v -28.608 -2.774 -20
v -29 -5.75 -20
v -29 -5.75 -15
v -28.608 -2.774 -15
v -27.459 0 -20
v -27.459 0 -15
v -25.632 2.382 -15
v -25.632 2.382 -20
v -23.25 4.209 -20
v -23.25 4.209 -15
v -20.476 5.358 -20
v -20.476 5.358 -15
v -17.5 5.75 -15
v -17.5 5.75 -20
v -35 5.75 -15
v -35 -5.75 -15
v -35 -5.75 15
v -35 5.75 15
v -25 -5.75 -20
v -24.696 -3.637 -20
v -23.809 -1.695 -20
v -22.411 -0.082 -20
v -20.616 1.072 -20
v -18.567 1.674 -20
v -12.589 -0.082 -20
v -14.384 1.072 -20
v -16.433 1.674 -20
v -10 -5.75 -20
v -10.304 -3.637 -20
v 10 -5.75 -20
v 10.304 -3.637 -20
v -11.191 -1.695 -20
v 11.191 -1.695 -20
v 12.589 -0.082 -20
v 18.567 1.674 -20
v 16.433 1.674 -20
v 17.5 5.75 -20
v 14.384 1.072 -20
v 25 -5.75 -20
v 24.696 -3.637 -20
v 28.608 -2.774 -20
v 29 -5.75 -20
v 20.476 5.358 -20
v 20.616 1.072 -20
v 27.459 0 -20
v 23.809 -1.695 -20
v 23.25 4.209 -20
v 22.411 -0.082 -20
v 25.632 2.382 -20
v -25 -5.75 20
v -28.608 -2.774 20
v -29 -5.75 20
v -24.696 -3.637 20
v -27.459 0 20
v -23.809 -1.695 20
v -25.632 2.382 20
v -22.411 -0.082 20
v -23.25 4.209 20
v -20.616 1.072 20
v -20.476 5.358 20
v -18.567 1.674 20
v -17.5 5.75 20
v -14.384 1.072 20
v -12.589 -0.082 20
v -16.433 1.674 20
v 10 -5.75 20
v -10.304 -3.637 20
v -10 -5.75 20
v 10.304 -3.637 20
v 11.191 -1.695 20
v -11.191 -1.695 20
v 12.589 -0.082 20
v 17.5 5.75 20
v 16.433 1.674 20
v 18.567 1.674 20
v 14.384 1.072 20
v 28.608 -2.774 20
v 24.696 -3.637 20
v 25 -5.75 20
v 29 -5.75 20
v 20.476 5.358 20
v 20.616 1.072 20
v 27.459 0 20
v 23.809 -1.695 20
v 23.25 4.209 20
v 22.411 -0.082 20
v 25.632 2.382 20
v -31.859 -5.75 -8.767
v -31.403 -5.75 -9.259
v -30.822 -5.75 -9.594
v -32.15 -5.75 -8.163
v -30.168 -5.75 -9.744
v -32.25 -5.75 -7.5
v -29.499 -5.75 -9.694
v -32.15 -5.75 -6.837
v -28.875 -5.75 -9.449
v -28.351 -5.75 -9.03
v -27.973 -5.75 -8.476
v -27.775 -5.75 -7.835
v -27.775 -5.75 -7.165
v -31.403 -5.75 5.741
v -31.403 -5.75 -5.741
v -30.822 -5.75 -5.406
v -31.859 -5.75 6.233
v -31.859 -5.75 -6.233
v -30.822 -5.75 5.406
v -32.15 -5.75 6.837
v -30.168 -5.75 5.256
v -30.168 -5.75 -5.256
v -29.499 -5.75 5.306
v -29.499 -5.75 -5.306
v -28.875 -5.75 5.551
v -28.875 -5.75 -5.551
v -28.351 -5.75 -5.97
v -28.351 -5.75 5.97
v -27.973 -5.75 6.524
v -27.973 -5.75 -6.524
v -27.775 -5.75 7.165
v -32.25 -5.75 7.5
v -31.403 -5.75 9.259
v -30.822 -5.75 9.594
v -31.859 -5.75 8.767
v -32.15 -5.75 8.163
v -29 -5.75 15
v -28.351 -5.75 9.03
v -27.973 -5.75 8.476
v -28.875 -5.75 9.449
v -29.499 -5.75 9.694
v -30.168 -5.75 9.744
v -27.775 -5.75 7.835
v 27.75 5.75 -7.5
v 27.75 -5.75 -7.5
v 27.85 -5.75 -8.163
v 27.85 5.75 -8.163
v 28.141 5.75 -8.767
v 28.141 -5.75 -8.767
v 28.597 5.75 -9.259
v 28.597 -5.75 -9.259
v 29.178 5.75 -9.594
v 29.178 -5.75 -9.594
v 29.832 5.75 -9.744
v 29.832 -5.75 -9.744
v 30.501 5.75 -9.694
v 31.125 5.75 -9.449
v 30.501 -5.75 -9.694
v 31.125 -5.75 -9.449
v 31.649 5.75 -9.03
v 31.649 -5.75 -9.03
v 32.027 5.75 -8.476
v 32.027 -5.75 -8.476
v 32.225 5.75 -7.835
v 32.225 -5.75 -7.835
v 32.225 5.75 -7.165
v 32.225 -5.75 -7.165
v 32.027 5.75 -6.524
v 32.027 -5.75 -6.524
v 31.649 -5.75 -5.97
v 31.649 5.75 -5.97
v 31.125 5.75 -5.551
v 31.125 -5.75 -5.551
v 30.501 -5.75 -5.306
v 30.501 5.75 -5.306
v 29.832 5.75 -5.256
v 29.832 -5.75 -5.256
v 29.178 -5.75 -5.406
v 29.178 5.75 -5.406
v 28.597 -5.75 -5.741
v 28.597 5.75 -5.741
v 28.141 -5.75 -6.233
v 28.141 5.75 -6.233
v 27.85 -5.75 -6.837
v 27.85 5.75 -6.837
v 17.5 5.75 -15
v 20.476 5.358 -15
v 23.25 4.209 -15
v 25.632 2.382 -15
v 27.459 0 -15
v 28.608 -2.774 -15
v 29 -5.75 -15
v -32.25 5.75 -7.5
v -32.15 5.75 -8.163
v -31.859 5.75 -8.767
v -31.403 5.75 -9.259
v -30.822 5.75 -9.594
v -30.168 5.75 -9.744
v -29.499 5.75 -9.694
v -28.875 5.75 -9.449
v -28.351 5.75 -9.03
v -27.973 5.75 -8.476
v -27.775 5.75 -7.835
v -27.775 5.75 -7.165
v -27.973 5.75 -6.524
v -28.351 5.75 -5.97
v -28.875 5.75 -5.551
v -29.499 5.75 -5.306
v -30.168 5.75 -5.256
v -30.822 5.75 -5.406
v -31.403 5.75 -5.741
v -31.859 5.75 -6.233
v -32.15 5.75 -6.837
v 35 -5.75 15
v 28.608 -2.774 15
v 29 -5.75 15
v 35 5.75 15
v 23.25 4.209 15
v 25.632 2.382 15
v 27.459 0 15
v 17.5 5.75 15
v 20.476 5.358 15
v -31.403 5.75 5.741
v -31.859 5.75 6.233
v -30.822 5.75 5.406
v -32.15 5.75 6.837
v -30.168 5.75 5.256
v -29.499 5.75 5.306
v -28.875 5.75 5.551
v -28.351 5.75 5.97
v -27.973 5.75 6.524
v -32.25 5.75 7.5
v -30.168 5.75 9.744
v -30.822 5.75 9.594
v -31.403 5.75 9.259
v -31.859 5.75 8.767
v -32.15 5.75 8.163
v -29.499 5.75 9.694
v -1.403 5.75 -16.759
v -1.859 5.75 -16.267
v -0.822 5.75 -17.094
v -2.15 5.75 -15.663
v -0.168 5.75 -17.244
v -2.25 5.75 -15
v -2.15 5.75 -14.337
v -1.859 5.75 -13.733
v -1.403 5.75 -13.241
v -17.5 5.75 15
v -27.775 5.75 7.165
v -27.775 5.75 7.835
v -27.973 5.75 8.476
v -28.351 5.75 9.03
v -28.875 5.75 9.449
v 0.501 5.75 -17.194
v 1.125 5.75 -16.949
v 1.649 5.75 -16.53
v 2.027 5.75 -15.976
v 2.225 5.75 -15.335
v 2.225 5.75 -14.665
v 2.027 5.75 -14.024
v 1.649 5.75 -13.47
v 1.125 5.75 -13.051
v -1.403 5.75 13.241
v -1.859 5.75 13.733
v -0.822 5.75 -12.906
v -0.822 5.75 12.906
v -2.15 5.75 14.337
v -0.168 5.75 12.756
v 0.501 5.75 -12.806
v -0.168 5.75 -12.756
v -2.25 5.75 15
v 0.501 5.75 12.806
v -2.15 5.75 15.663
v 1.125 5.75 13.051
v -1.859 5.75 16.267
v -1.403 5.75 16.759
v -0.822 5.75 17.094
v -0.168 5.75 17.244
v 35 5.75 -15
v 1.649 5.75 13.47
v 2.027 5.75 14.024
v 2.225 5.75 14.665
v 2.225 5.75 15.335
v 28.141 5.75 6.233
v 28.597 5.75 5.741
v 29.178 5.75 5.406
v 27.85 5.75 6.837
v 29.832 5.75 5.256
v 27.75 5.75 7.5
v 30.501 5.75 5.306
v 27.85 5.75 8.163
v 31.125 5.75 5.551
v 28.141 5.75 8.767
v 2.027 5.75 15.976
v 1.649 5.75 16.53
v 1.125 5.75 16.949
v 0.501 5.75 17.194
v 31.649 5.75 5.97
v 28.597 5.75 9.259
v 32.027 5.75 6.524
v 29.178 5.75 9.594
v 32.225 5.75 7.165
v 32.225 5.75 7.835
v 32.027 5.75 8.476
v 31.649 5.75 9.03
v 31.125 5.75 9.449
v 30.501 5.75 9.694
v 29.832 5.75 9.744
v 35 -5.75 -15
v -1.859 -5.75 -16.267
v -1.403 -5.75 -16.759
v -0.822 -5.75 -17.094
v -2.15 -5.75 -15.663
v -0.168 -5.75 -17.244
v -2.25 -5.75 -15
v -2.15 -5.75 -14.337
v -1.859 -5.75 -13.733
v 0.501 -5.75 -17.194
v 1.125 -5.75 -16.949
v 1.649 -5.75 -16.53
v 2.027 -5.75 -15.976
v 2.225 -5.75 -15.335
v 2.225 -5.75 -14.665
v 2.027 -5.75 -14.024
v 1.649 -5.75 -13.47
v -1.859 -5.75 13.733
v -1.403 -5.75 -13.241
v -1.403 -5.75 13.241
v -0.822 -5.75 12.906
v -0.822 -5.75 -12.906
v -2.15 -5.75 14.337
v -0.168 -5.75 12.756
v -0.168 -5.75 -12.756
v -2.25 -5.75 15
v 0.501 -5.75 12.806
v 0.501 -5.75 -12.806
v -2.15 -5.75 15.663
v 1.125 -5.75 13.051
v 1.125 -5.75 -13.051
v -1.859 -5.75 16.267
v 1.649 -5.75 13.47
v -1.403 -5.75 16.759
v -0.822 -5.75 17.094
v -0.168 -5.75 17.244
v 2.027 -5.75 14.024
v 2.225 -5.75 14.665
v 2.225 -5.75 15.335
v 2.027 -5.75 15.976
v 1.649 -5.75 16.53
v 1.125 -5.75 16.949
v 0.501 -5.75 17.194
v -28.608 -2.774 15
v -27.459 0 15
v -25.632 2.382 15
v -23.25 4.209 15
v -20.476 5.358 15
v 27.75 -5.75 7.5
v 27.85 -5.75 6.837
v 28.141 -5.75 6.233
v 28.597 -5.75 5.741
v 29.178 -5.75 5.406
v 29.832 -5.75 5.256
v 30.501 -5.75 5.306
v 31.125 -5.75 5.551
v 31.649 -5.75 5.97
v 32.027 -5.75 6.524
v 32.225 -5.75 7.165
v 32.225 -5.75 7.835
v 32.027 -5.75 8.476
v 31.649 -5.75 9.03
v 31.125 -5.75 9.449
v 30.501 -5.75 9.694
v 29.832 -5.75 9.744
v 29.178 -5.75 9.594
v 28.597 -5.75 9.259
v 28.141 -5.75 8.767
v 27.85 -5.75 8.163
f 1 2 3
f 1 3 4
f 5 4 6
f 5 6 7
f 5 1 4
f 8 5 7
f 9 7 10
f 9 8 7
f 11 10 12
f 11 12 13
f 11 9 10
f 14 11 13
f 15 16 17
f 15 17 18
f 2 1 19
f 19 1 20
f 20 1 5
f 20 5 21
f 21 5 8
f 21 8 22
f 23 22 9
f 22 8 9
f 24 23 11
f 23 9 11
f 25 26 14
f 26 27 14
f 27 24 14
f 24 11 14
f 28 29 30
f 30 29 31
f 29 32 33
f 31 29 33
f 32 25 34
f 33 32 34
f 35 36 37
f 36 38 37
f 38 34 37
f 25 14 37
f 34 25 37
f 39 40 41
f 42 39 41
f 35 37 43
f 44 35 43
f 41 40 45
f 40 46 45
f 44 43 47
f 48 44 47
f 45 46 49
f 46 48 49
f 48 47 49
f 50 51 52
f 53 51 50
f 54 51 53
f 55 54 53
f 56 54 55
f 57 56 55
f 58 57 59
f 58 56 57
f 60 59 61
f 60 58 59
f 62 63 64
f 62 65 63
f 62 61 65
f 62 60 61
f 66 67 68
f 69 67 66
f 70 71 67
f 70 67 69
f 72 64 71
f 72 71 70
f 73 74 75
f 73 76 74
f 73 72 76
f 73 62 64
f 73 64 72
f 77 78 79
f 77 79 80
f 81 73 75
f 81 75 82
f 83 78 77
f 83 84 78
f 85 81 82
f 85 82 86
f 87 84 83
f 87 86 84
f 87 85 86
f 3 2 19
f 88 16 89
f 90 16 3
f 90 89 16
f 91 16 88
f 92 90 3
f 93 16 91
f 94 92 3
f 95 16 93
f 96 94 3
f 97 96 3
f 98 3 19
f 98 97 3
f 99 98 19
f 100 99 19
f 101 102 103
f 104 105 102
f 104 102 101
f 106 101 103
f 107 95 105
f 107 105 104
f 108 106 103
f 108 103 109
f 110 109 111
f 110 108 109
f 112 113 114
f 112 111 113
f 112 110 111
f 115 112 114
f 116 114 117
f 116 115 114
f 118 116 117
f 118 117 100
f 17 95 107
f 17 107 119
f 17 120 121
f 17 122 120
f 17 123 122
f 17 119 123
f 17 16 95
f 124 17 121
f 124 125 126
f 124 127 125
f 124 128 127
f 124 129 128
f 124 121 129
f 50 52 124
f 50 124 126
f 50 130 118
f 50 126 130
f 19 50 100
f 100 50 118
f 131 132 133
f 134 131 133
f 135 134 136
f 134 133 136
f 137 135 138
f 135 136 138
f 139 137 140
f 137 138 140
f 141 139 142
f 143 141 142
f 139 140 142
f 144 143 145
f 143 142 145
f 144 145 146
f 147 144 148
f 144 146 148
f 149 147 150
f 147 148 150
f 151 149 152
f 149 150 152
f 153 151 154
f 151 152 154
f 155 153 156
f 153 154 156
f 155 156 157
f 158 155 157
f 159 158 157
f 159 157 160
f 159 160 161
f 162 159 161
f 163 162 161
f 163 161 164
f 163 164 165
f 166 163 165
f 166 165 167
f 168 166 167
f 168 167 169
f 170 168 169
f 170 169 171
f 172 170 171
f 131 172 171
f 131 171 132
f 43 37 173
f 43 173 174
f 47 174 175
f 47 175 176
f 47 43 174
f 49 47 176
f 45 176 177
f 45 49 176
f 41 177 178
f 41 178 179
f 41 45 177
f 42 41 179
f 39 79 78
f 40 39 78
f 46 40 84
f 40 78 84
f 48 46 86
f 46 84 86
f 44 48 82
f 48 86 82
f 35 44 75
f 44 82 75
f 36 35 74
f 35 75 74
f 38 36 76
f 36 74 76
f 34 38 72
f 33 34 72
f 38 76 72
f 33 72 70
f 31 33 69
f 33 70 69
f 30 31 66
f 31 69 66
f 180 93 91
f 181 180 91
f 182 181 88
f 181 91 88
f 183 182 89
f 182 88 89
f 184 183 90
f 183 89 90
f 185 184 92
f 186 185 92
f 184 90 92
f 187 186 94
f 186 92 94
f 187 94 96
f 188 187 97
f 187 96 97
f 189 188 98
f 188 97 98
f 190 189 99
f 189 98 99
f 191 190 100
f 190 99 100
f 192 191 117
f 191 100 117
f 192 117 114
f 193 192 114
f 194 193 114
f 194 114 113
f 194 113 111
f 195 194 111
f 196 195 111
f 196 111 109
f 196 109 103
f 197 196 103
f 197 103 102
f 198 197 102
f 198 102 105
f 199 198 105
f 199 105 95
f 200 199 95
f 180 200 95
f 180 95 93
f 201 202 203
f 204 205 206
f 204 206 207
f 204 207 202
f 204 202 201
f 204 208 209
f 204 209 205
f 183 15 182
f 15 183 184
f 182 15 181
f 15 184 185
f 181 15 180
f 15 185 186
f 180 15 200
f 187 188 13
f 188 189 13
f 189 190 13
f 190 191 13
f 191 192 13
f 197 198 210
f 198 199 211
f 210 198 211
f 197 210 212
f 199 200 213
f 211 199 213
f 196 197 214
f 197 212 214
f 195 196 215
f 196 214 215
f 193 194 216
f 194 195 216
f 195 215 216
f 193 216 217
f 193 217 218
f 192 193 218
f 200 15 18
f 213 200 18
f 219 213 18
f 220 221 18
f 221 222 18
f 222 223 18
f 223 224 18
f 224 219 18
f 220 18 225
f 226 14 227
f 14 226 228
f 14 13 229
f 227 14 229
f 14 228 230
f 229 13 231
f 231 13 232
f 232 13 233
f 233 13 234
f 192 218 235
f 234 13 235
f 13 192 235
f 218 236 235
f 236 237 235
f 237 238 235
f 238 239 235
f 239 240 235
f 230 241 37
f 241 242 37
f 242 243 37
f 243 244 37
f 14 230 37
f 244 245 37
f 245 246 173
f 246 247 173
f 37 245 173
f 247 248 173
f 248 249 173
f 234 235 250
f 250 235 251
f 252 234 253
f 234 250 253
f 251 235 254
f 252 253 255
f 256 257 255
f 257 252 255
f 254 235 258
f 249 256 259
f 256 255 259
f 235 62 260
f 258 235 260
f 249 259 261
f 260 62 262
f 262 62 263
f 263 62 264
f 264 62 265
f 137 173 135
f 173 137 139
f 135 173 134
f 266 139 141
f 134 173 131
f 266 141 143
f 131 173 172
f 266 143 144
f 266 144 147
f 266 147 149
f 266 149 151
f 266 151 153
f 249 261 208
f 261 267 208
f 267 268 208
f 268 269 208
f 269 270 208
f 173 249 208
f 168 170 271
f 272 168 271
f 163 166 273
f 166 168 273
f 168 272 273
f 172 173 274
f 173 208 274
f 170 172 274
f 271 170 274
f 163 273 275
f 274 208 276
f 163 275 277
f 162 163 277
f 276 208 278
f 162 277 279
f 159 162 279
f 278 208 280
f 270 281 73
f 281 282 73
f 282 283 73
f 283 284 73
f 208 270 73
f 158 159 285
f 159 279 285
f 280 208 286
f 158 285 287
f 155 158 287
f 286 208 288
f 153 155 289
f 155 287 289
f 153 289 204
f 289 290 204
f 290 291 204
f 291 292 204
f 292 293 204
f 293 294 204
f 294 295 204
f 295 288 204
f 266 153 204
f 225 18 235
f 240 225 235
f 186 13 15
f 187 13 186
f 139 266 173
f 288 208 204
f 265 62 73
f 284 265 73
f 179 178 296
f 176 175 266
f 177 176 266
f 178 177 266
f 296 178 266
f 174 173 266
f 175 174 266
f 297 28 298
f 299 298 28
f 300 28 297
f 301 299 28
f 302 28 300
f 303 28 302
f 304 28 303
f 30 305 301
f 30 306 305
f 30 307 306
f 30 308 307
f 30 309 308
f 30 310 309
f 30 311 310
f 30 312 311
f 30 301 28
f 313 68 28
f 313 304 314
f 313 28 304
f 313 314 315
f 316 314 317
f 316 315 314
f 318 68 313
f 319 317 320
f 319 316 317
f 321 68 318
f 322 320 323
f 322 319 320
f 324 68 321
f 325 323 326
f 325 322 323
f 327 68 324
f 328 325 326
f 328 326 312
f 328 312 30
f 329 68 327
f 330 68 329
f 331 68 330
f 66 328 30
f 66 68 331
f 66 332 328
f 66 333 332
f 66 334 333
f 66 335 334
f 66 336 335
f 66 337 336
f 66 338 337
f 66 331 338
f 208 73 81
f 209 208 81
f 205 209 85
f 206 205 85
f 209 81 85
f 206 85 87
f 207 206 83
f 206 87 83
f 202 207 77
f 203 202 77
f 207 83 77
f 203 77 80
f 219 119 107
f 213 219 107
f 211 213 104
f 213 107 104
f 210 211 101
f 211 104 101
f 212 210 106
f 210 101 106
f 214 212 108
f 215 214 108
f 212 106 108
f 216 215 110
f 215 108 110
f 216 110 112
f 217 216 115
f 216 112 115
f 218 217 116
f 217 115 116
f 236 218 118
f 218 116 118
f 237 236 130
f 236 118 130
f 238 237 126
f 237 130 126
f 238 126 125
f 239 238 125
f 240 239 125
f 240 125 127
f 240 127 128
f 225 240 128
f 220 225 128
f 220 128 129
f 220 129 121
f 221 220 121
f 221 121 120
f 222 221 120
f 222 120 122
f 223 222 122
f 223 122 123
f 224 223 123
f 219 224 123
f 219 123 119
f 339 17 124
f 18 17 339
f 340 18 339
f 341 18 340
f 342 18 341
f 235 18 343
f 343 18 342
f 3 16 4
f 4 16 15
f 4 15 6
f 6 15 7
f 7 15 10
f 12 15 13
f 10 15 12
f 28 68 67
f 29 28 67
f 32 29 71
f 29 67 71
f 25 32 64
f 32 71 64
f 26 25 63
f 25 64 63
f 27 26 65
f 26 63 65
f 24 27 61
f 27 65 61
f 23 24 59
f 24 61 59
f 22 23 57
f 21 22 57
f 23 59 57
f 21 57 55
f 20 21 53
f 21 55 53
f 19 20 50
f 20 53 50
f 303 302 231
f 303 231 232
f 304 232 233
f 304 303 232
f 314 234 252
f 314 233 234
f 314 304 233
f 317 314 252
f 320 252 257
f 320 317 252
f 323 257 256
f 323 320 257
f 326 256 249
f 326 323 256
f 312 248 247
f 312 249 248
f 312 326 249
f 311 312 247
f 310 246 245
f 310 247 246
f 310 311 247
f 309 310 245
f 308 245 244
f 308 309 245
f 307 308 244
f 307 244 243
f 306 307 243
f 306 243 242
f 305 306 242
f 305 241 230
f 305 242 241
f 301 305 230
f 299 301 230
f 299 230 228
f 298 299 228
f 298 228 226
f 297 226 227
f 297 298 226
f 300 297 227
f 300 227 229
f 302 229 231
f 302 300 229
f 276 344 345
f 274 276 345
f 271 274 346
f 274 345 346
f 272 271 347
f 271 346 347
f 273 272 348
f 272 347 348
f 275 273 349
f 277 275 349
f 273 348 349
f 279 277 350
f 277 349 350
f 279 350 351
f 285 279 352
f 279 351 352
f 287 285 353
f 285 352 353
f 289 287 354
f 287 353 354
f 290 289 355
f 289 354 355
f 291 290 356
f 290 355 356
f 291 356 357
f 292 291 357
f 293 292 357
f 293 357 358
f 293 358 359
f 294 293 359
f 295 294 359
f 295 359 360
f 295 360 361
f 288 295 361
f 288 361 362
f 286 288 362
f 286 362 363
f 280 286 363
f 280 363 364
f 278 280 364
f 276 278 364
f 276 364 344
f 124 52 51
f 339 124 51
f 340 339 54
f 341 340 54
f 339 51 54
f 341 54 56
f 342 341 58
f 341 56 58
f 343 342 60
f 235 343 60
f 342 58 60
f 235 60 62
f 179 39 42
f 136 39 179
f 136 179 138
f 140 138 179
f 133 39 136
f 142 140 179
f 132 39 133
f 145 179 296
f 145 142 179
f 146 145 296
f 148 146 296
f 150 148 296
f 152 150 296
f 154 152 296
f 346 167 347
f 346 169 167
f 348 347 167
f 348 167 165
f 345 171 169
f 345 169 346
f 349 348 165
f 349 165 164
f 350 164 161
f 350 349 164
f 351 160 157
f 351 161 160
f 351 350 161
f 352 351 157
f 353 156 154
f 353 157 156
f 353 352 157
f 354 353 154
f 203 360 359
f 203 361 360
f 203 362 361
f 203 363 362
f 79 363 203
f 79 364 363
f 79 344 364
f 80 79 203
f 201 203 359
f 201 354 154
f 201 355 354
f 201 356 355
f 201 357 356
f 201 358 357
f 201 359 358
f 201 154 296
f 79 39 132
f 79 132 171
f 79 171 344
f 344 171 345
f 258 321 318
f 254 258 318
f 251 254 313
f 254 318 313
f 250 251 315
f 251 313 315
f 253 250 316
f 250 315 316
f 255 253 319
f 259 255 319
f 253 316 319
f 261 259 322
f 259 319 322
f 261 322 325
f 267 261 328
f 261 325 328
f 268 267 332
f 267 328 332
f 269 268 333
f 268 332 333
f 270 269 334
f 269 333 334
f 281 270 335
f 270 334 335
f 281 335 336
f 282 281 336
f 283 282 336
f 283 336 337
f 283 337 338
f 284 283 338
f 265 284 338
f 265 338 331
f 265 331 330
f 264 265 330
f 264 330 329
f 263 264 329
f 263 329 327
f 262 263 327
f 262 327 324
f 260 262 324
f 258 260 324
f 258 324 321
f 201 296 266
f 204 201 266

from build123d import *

# Parameters (mm, degrees)
SKETCH1_W            = 70
SKETCH1_H            = 11.5
BOSS_EXTRUDE1_DEPTH  = 20
CUT_EXTRUDE1_REACH   = 55.461
CUT_EXTRUDE2_DEPTH   = 5
HOLE1_D              = 4.5
LPATTERN1_COUNT      = 2
LPATTERN1_PITCH      = 60
LPATTERN1_COUNT_DIR2 = 2
LPATTERN1_PITCH_DIR2 = 15
HOLE2_D              = 4.5


with BuildPart() as part:
    # Sketch1 → Boss-Extrude1 (new, symmetric)
    with BuildSketch(Plane.XY):
        Rectangle(SKETCH1_W, SKETCH1_H)
    extrude(amount=BOSS_EXTRUDE1_DEPTH, both=True)

    # Sketch2 → Cut-Extrude1 (cut, up to next)
    with BuildSketch(Plane.XY.offset(20), mode=Mode.PRIVATE) as cut_extrude1_sk1:
        with BuildLine():
            Line((-25, -5.75), (-10, -5.75))
            ThreePointArc((-10, -5.75), (-17.5, 1.75), (-25, -5.75))
        make_face()
    cut_extrude1_tool1 = extrude(cut_extrude1_sk1.sketch, amount=-CUT_EXTRUDE1_REACH, mode=Mode.PRIVATE) & part.part
    # Sketch2 → Cut-Extrude1 (cut, up to next)
    with BuildSketch(Plane.XY.offset(20), mode=Mode.PRIVATE) as cut_extrude1_sk2:
        with BuildLine():
            Line((10, -5.75), (25, -5.75))
            ThreePointArc((25, -5.75), (17.5, 1.75), (10, -5.75))
        make_face()
    cut_extrude1_tool2 = extrude(cut_extrude1_sk2.sketch, amount=-CUT_EXTRUDE1_REACH, mode=Mode.PRIVATE) & part.part
    add(cut_extrude1_tool1.solids().sort_by_distance((-17.5, -2.566901, 20))[0], mode=Mode.SUBTRACT)
    add(cut_extrude1_tool2.solids().sort_by_distance((17.5, -2.566901, 20))[0], mode=Mode.SUBTRACT)

    # Sketch3 → Cut-Extrude2 (cut)
    with BuildSketch(Plane.XY.offset(20)):
        with BuildLine():
            Line((-35, 5.75), (-35, -5.75))
            Line((-35, -5.75), (-29, -5.75))
            ThreePointArc((-29, -5.75), (-25.631727984, 2.381727984), (-17.5, 5.75))
            Line((-17.5, 5.75), (-35, 5.75))
        make_face()
        with BuildLine():
            Line((29, -5.75), (35, -5.75))
            Line((35, -5.75), (35, 5.75))
            Line((35, 5.75), (17.5, 5.75))
            ThreePointArc((17.5, 5.75), (25.631727984, 2.381727984), (29, -5.75))
        make_face()
    cut_extrude2 = extrude(amount=-CUT_EXTRUDE2_DEPTH, mode=Mode.SUBTRACT)

    # Mirror1: Cut-Extrude2 across plane
    add(cut_extrude2.mirror(Plane.XY), mode=Mode.SUBTRACT)

    # Hole1 (through all)
    with Locations(Plane(origin=(0, 5.75, 0), x_dir=(1, 0, 0), z_dir=(0, 1, 0))):
        with Locations((30, -7.5)):
            hole1 = Hole(HOLE1_D / 2)

    # LPattern1: Hole1 2 × 2
    with Locations(*[(-i * LPATTERN1_PITCH, 0, -j * LPATTERN1_PITCH_DIR2) for i in range(LPATTERN1_COUNT) for j in range(LPATTERN1_COUNT_DIR2) if (i, j) != (0, 0)]):
        add(hole1, mode=Mode.SUBTRACT)

    # Hole2 (through all)
    with Locations(Plane(origin=(0, 5.75, 0), x_dir=(1, 0, 0), z_dir=(0, 1, 0))):
        with Locations((0, -15)):
            hole2 = Hole(HOLE2_D / 2)

    # Mirror2: Hole2 across plane
    add(hole2.mirror(Plane.XY), mode=Mode.SUBTRACT)


solid = part.part
